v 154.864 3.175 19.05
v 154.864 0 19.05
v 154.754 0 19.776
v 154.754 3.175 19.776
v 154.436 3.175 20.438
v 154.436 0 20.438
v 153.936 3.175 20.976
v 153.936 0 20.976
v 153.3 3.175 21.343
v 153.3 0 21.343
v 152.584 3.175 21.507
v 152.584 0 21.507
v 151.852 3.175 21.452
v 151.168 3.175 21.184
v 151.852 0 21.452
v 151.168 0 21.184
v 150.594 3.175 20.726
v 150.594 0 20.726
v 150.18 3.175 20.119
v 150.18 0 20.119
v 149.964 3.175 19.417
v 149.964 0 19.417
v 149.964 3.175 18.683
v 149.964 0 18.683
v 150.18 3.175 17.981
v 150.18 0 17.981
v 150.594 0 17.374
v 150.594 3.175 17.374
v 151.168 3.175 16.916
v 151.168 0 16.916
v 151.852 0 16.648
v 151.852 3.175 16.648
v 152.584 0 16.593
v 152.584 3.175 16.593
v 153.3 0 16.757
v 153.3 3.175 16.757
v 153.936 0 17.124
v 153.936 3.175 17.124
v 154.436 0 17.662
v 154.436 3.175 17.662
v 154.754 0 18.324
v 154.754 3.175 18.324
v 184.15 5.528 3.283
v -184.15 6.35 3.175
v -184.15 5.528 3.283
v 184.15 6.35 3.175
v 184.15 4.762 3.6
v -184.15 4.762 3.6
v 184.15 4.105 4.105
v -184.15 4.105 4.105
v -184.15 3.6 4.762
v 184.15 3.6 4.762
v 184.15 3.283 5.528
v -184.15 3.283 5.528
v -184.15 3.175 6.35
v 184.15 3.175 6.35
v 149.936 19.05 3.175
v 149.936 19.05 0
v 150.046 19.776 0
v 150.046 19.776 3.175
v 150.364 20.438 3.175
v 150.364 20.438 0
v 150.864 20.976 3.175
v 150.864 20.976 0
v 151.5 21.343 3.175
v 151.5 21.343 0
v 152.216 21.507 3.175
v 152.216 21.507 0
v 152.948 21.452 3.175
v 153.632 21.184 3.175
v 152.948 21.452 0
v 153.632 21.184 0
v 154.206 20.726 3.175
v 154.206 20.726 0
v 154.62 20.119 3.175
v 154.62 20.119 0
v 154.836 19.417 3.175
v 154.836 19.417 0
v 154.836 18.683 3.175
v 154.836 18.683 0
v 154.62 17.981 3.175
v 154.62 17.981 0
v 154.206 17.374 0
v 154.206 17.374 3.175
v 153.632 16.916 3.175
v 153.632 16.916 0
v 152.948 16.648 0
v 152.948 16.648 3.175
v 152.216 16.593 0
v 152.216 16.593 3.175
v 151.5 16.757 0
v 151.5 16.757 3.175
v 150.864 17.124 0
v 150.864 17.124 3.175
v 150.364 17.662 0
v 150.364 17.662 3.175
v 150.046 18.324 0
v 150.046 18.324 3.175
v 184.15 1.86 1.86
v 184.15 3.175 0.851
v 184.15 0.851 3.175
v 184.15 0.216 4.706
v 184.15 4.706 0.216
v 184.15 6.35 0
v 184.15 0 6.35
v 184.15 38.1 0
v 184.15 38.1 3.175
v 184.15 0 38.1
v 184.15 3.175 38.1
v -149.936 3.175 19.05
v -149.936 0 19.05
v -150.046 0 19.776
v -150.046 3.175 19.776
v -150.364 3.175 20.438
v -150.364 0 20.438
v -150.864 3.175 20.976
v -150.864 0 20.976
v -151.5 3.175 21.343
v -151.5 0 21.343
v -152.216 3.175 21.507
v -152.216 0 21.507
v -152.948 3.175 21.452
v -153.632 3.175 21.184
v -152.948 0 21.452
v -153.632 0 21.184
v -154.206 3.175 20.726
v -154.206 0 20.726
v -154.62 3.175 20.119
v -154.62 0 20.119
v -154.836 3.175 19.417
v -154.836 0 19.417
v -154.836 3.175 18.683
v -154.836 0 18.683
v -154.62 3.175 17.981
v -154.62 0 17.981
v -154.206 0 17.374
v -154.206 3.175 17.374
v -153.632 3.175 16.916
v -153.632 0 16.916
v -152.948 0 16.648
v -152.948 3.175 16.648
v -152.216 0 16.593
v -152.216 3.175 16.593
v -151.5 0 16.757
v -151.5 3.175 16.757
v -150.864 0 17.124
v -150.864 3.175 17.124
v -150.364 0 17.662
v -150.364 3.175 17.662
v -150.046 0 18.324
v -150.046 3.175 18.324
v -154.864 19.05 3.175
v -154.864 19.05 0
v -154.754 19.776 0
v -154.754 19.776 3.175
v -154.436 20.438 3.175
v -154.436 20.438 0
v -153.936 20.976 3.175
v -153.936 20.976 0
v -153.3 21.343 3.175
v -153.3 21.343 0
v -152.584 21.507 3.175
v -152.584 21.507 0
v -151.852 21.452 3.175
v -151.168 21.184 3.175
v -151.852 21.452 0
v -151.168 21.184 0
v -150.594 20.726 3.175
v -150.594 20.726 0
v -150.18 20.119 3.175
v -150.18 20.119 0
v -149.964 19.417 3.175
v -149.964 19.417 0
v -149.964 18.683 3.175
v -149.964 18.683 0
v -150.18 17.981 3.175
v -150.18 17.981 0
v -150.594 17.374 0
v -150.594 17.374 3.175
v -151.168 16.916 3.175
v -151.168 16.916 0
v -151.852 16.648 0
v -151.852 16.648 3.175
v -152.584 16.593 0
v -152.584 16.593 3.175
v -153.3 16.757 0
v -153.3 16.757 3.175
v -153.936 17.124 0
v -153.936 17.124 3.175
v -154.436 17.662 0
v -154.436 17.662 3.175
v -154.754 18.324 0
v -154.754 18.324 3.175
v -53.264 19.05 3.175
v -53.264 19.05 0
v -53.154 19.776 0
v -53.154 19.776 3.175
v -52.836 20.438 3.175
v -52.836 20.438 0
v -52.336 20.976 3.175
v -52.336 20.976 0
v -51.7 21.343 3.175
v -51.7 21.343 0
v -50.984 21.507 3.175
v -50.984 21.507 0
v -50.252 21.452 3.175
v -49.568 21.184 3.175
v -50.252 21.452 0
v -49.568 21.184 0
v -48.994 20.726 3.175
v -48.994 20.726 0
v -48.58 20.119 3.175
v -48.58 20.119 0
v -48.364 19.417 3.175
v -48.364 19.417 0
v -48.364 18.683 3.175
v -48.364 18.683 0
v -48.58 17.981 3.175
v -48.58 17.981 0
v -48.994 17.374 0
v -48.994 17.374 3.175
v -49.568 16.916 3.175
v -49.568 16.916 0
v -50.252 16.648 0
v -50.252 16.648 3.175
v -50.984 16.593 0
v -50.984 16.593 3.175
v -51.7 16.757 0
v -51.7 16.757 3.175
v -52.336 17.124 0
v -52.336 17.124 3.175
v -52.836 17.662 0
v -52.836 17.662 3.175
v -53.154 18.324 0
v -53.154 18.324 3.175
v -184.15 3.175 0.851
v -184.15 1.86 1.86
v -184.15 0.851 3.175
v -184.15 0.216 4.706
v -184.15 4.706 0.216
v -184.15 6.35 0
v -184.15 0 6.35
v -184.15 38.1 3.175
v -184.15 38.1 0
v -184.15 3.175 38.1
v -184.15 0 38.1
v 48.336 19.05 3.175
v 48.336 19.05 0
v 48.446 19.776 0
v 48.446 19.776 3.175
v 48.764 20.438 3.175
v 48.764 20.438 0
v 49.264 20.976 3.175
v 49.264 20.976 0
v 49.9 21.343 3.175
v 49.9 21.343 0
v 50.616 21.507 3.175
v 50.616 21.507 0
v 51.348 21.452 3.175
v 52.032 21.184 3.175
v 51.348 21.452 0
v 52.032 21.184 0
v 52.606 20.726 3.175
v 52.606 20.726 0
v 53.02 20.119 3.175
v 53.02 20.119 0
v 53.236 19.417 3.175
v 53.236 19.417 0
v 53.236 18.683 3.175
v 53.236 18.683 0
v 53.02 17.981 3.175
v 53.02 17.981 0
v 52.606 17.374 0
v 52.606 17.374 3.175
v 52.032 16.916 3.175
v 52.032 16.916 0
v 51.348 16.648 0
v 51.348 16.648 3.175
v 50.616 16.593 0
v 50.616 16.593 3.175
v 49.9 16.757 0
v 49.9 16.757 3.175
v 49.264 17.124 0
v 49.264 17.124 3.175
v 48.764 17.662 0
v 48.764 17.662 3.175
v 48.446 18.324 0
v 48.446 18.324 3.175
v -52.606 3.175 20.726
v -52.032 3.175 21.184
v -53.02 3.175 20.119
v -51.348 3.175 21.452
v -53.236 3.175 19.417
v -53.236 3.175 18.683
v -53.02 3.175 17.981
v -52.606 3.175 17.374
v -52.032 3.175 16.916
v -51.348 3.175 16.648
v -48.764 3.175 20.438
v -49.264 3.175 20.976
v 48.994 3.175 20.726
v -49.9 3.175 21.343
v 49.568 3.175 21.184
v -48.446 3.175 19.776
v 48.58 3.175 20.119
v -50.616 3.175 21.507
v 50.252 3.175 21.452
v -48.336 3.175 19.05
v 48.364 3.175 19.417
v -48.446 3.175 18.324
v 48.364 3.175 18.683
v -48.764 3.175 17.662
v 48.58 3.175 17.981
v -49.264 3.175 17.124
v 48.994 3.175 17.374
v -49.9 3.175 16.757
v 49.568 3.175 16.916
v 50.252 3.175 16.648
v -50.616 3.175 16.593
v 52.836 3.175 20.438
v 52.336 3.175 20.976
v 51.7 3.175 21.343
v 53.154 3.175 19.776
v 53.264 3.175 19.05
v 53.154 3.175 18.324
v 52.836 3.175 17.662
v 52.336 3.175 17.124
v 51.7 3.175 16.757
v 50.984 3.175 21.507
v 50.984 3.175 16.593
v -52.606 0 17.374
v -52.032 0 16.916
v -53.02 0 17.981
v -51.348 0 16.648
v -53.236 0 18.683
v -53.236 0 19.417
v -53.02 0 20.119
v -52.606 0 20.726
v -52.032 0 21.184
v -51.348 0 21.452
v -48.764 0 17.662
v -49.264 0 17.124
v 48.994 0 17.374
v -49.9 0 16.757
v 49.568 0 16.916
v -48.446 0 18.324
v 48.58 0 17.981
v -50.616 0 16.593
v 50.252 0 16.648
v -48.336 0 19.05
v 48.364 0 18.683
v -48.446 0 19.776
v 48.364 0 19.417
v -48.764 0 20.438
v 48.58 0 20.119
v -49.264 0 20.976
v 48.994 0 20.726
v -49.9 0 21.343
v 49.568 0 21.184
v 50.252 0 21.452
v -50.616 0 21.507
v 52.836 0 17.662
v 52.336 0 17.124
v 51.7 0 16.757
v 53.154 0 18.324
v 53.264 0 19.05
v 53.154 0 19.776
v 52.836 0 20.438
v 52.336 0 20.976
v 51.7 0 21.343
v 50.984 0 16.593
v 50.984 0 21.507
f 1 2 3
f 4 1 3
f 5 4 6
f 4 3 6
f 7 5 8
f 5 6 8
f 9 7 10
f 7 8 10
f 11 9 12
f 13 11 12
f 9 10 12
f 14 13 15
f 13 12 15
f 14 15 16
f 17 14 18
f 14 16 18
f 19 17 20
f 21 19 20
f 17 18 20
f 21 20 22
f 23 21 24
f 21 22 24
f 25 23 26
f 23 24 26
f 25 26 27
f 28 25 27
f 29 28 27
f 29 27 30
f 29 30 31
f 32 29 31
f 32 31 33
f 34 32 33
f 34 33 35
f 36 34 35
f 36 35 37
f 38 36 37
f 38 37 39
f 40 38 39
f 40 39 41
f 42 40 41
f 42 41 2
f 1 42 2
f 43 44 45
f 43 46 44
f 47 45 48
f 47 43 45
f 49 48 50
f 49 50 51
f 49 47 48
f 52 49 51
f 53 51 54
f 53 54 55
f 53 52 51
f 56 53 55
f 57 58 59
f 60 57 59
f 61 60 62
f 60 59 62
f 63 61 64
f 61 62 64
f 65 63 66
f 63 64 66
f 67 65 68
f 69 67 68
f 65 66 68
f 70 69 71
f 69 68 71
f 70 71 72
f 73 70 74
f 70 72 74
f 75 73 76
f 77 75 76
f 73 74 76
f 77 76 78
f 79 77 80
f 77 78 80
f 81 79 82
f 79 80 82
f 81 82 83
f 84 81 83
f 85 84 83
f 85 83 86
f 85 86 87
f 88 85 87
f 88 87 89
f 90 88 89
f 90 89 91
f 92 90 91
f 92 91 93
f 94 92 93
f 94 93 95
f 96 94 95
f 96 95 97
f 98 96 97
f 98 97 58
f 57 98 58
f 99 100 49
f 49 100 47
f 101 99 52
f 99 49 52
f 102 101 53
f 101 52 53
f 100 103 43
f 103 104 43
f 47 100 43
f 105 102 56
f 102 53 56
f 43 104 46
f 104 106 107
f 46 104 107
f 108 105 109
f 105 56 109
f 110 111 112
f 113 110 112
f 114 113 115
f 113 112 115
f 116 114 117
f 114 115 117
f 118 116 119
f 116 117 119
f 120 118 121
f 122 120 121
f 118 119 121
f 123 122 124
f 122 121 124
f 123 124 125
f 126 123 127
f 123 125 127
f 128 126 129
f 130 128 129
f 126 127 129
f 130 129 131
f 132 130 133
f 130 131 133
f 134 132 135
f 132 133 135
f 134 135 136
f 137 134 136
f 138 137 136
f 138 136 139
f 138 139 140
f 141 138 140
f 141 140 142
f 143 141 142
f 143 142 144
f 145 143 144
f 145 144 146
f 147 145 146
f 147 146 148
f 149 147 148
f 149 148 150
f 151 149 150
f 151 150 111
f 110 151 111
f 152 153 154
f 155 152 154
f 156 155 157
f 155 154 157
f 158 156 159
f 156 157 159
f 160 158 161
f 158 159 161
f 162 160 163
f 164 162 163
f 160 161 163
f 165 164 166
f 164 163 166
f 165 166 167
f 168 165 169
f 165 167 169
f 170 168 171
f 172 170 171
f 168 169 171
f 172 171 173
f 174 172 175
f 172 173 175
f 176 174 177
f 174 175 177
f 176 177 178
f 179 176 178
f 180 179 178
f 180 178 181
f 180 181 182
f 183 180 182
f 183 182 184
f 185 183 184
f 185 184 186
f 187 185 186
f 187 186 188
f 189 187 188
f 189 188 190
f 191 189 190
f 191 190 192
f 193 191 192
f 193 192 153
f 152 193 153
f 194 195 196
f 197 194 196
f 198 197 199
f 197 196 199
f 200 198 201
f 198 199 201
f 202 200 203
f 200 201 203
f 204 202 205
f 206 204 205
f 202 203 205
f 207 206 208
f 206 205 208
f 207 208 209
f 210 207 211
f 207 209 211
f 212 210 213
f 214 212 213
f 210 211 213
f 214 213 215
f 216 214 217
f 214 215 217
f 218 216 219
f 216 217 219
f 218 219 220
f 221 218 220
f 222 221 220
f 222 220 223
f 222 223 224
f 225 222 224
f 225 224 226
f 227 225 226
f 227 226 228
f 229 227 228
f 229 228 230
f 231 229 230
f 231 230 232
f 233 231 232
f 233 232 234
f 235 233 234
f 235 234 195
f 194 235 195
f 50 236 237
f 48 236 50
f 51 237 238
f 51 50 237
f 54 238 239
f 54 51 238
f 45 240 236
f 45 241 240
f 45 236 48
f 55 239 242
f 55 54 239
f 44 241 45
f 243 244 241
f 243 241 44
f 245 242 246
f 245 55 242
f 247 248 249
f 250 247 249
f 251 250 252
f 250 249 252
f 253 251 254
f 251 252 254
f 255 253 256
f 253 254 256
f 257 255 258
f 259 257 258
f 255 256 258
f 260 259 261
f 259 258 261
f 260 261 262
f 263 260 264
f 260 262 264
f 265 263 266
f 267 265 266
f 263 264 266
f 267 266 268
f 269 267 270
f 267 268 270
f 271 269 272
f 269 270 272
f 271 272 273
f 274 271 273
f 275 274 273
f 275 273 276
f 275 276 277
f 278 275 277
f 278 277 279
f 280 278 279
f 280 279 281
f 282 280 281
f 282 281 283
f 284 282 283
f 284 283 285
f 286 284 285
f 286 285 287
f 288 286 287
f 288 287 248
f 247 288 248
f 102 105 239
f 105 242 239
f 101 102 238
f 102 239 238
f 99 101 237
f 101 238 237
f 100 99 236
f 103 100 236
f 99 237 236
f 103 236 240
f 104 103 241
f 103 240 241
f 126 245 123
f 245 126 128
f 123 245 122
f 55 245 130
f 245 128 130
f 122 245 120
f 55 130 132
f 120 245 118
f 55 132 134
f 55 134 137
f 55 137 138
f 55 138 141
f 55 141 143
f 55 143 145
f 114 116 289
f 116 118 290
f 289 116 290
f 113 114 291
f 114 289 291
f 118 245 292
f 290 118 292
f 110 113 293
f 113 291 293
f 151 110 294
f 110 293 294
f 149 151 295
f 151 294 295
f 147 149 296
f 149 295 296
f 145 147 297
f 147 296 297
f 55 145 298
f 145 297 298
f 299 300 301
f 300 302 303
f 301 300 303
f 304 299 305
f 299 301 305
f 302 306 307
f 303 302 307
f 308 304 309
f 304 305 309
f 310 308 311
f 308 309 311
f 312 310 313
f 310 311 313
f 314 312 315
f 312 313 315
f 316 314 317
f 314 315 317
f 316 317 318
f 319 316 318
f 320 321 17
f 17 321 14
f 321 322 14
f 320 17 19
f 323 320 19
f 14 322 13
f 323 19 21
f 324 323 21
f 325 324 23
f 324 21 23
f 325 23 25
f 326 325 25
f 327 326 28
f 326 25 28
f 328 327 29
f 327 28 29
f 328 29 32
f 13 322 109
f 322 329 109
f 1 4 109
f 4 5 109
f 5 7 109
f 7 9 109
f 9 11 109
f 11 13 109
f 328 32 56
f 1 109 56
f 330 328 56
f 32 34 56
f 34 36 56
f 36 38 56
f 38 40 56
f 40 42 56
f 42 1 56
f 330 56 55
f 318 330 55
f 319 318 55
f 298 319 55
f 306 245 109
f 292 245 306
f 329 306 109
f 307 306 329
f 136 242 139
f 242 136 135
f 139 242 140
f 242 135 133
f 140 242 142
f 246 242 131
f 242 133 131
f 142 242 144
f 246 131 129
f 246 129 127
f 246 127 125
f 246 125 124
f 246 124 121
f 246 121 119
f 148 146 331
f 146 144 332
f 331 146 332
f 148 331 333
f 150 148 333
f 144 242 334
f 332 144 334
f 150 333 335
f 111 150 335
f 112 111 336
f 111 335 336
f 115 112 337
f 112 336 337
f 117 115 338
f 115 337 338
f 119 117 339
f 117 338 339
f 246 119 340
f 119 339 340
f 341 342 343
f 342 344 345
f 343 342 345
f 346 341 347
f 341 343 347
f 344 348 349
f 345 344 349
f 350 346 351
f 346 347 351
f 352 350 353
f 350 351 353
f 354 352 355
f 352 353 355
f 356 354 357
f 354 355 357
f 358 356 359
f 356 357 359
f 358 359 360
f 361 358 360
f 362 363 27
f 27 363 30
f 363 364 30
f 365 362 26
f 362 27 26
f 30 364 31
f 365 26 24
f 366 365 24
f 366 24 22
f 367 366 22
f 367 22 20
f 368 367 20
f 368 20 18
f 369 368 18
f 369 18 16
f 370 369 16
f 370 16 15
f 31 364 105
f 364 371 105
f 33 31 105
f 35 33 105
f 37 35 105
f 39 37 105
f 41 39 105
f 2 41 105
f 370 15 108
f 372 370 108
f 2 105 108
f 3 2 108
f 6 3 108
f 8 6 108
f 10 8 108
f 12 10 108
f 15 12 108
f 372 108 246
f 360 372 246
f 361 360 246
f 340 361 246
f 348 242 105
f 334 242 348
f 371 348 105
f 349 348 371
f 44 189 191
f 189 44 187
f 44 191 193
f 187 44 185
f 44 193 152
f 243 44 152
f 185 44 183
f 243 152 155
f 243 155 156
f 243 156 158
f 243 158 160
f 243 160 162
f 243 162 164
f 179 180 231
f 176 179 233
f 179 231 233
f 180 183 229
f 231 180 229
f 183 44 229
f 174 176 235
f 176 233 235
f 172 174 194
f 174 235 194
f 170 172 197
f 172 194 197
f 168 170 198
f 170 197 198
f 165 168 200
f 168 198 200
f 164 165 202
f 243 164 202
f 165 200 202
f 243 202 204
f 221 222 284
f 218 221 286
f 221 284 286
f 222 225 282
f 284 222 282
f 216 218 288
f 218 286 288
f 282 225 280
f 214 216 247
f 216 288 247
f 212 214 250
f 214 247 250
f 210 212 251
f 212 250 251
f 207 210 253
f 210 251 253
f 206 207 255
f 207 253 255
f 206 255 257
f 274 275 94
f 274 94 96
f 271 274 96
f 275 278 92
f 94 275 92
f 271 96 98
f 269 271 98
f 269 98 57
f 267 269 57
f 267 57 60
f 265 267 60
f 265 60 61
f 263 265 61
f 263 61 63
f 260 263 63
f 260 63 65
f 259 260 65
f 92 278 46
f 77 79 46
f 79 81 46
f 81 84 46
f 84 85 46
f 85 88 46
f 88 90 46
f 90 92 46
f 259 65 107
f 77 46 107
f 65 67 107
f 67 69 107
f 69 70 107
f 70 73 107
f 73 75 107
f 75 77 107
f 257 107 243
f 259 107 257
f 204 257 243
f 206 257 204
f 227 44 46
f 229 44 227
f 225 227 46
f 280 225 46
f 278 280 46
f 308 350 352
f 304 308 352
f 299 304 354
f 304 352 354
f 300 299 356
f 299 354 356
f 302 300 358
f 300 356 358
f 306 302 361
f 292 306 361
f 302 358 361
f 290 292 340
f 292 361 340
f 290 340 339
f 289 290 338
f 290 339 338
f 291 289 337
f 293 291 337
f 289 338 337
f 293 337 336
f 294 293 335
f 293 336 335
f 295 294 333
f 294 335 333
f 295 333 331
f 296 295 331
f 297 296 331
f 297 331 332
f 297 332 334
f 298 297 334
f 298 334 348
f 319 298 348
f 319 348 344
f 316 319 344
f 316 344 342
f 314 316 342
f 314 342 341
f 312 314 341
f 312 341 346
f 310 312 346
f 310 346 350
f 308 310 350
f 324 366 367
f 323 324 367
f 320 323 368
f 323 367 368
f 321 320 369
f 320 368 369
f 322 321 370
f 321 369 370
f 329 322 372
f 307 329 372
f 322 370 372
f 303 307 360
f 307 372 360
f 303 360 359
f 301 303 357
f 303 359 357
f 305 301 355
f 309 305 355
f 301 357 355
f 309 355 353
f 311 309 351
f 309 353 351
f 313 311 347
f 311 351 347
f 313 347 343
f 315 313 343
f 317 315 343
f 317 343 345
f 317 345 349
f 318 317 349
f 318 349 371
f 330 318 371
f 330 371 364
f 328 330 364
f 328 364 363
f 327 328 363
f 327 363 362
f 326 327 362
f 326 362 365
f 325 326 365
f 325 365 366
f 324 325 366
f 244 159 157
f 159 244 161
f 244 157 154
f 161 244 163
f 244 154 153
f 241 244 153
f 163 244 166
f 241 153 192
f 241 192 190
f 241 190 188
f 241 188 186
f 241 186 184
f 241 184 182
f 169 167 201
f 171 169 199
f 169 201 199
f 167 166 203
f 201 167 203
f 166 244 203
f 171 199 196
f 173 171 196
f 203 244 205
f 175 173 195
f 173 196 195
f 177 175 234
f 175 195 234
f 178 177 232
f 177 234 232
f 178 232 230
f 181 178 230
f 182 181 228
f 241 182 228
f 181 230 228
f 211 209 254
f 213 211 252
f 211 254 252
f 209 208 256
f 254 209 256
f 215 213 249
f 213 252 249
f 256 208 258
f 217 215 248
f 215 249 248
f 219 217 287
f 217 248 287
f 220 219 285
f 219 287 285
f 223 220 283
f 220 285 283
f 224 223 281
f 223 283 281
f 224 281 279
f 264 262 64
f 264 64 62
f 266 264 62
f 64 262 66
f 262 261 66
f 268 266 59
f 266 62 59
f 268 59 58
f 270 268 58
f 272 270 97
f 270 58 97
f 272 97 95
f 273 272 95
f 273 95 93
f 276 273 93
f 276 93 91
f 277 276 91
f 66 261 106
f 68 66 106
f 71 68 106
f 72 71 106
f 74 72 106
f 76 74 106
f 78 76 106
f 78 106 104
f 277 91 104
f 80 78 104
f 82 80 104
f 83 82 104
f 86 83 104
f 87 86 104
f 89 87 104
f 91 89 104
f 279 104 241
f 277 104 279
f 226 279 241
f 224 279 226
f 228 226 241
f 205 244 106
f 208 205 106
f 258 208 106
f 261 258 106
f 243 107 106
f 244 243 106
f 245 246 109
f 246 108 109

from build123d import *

# Parameters (mm, degrees)
BOSS_EXTRUDE1_DEPTH = 184.15
FILLET1_R           = 3.175
FILLET2_R           = 6.35
SKETCH2_R           = 2.4638
CUT_EXTRUDE1_DEPTH  = 39.1
SKETCH3_R           = 2.4638
CUT_EXTRUDE2_DEPTH  = 39.1
LPATTERN1_COUNT     = 4
LPATTERN1_PITCH     = 101.6


with BuildPart() as part:
    # Sketch1 → Boss-Extrude1 (new body, symmetric)
    with BuildSketch(Plane(origin=(0, 0, 0), x_dir=(0, 0, -1), z_dir=(1, 0, 0))):
        Polygon((0, 38.1), (0, 0), (-38.1, 0), (-38.1, 3.175), (-3.175, 3.175), (-3.175, 38.1), align=None)
    extrude(amount=BOSS_EXTRUDE1_DEPTH, both=True)

    # Fillet1
    fillet1_edges = [part.edges().sort_by_distance(p)[0] for p in [
        (0, 3.175, 3.175),
    ]]
    fillet(fillet1_edges, radius=FILLET1_R)

    # Fillet2
    fillet2_edges = [part.edges().sort_by_distance(p)[0] for p in [
        (0, 0, 0),
    ]]
    fillet(fillet2_edges, radius=FILLET2_R)

    # Sketch2 → Cut-Extrude1 (cut, through all)
    with BuildSketch(Plane(origin=(0, 0, 0), x_dir=(-1, 0, 0), z_dir=(0, 0, -1))):
        with Locations((152.4, 19.05)):
            Circle(SKETCH2_R)
    cut_extrude1 = extrude(amount=-CUT_EXTRUDE1_DEPTH, mode=Mode.SUBTRACT)

    # Sketch3 → Cut-Extrude2 (cut, through all)
    with BuildSketch(Plane.XZ):
        with Locations((-152.4, 19.05)):
            Circle(SKETCH3_R)
    cut_extrude2 = extrude(amount=-CUT_EXTRUDE2_DEPTH, mode=Mode.SUBTRACT)

    # LPattern1: Cut-Extrude1, Cut-Extrude2 ×4
    with Locations(*[(i * LPATTERN1_PITCH, 0, 0) for i in range(1, LPATTERN1_COUNT)]):
        add(cut_extrude1, mode=Mode.SUBTRACT)
        add(cut_extrude2, mode=Mode.SUBTRACT)


solid = part.part
